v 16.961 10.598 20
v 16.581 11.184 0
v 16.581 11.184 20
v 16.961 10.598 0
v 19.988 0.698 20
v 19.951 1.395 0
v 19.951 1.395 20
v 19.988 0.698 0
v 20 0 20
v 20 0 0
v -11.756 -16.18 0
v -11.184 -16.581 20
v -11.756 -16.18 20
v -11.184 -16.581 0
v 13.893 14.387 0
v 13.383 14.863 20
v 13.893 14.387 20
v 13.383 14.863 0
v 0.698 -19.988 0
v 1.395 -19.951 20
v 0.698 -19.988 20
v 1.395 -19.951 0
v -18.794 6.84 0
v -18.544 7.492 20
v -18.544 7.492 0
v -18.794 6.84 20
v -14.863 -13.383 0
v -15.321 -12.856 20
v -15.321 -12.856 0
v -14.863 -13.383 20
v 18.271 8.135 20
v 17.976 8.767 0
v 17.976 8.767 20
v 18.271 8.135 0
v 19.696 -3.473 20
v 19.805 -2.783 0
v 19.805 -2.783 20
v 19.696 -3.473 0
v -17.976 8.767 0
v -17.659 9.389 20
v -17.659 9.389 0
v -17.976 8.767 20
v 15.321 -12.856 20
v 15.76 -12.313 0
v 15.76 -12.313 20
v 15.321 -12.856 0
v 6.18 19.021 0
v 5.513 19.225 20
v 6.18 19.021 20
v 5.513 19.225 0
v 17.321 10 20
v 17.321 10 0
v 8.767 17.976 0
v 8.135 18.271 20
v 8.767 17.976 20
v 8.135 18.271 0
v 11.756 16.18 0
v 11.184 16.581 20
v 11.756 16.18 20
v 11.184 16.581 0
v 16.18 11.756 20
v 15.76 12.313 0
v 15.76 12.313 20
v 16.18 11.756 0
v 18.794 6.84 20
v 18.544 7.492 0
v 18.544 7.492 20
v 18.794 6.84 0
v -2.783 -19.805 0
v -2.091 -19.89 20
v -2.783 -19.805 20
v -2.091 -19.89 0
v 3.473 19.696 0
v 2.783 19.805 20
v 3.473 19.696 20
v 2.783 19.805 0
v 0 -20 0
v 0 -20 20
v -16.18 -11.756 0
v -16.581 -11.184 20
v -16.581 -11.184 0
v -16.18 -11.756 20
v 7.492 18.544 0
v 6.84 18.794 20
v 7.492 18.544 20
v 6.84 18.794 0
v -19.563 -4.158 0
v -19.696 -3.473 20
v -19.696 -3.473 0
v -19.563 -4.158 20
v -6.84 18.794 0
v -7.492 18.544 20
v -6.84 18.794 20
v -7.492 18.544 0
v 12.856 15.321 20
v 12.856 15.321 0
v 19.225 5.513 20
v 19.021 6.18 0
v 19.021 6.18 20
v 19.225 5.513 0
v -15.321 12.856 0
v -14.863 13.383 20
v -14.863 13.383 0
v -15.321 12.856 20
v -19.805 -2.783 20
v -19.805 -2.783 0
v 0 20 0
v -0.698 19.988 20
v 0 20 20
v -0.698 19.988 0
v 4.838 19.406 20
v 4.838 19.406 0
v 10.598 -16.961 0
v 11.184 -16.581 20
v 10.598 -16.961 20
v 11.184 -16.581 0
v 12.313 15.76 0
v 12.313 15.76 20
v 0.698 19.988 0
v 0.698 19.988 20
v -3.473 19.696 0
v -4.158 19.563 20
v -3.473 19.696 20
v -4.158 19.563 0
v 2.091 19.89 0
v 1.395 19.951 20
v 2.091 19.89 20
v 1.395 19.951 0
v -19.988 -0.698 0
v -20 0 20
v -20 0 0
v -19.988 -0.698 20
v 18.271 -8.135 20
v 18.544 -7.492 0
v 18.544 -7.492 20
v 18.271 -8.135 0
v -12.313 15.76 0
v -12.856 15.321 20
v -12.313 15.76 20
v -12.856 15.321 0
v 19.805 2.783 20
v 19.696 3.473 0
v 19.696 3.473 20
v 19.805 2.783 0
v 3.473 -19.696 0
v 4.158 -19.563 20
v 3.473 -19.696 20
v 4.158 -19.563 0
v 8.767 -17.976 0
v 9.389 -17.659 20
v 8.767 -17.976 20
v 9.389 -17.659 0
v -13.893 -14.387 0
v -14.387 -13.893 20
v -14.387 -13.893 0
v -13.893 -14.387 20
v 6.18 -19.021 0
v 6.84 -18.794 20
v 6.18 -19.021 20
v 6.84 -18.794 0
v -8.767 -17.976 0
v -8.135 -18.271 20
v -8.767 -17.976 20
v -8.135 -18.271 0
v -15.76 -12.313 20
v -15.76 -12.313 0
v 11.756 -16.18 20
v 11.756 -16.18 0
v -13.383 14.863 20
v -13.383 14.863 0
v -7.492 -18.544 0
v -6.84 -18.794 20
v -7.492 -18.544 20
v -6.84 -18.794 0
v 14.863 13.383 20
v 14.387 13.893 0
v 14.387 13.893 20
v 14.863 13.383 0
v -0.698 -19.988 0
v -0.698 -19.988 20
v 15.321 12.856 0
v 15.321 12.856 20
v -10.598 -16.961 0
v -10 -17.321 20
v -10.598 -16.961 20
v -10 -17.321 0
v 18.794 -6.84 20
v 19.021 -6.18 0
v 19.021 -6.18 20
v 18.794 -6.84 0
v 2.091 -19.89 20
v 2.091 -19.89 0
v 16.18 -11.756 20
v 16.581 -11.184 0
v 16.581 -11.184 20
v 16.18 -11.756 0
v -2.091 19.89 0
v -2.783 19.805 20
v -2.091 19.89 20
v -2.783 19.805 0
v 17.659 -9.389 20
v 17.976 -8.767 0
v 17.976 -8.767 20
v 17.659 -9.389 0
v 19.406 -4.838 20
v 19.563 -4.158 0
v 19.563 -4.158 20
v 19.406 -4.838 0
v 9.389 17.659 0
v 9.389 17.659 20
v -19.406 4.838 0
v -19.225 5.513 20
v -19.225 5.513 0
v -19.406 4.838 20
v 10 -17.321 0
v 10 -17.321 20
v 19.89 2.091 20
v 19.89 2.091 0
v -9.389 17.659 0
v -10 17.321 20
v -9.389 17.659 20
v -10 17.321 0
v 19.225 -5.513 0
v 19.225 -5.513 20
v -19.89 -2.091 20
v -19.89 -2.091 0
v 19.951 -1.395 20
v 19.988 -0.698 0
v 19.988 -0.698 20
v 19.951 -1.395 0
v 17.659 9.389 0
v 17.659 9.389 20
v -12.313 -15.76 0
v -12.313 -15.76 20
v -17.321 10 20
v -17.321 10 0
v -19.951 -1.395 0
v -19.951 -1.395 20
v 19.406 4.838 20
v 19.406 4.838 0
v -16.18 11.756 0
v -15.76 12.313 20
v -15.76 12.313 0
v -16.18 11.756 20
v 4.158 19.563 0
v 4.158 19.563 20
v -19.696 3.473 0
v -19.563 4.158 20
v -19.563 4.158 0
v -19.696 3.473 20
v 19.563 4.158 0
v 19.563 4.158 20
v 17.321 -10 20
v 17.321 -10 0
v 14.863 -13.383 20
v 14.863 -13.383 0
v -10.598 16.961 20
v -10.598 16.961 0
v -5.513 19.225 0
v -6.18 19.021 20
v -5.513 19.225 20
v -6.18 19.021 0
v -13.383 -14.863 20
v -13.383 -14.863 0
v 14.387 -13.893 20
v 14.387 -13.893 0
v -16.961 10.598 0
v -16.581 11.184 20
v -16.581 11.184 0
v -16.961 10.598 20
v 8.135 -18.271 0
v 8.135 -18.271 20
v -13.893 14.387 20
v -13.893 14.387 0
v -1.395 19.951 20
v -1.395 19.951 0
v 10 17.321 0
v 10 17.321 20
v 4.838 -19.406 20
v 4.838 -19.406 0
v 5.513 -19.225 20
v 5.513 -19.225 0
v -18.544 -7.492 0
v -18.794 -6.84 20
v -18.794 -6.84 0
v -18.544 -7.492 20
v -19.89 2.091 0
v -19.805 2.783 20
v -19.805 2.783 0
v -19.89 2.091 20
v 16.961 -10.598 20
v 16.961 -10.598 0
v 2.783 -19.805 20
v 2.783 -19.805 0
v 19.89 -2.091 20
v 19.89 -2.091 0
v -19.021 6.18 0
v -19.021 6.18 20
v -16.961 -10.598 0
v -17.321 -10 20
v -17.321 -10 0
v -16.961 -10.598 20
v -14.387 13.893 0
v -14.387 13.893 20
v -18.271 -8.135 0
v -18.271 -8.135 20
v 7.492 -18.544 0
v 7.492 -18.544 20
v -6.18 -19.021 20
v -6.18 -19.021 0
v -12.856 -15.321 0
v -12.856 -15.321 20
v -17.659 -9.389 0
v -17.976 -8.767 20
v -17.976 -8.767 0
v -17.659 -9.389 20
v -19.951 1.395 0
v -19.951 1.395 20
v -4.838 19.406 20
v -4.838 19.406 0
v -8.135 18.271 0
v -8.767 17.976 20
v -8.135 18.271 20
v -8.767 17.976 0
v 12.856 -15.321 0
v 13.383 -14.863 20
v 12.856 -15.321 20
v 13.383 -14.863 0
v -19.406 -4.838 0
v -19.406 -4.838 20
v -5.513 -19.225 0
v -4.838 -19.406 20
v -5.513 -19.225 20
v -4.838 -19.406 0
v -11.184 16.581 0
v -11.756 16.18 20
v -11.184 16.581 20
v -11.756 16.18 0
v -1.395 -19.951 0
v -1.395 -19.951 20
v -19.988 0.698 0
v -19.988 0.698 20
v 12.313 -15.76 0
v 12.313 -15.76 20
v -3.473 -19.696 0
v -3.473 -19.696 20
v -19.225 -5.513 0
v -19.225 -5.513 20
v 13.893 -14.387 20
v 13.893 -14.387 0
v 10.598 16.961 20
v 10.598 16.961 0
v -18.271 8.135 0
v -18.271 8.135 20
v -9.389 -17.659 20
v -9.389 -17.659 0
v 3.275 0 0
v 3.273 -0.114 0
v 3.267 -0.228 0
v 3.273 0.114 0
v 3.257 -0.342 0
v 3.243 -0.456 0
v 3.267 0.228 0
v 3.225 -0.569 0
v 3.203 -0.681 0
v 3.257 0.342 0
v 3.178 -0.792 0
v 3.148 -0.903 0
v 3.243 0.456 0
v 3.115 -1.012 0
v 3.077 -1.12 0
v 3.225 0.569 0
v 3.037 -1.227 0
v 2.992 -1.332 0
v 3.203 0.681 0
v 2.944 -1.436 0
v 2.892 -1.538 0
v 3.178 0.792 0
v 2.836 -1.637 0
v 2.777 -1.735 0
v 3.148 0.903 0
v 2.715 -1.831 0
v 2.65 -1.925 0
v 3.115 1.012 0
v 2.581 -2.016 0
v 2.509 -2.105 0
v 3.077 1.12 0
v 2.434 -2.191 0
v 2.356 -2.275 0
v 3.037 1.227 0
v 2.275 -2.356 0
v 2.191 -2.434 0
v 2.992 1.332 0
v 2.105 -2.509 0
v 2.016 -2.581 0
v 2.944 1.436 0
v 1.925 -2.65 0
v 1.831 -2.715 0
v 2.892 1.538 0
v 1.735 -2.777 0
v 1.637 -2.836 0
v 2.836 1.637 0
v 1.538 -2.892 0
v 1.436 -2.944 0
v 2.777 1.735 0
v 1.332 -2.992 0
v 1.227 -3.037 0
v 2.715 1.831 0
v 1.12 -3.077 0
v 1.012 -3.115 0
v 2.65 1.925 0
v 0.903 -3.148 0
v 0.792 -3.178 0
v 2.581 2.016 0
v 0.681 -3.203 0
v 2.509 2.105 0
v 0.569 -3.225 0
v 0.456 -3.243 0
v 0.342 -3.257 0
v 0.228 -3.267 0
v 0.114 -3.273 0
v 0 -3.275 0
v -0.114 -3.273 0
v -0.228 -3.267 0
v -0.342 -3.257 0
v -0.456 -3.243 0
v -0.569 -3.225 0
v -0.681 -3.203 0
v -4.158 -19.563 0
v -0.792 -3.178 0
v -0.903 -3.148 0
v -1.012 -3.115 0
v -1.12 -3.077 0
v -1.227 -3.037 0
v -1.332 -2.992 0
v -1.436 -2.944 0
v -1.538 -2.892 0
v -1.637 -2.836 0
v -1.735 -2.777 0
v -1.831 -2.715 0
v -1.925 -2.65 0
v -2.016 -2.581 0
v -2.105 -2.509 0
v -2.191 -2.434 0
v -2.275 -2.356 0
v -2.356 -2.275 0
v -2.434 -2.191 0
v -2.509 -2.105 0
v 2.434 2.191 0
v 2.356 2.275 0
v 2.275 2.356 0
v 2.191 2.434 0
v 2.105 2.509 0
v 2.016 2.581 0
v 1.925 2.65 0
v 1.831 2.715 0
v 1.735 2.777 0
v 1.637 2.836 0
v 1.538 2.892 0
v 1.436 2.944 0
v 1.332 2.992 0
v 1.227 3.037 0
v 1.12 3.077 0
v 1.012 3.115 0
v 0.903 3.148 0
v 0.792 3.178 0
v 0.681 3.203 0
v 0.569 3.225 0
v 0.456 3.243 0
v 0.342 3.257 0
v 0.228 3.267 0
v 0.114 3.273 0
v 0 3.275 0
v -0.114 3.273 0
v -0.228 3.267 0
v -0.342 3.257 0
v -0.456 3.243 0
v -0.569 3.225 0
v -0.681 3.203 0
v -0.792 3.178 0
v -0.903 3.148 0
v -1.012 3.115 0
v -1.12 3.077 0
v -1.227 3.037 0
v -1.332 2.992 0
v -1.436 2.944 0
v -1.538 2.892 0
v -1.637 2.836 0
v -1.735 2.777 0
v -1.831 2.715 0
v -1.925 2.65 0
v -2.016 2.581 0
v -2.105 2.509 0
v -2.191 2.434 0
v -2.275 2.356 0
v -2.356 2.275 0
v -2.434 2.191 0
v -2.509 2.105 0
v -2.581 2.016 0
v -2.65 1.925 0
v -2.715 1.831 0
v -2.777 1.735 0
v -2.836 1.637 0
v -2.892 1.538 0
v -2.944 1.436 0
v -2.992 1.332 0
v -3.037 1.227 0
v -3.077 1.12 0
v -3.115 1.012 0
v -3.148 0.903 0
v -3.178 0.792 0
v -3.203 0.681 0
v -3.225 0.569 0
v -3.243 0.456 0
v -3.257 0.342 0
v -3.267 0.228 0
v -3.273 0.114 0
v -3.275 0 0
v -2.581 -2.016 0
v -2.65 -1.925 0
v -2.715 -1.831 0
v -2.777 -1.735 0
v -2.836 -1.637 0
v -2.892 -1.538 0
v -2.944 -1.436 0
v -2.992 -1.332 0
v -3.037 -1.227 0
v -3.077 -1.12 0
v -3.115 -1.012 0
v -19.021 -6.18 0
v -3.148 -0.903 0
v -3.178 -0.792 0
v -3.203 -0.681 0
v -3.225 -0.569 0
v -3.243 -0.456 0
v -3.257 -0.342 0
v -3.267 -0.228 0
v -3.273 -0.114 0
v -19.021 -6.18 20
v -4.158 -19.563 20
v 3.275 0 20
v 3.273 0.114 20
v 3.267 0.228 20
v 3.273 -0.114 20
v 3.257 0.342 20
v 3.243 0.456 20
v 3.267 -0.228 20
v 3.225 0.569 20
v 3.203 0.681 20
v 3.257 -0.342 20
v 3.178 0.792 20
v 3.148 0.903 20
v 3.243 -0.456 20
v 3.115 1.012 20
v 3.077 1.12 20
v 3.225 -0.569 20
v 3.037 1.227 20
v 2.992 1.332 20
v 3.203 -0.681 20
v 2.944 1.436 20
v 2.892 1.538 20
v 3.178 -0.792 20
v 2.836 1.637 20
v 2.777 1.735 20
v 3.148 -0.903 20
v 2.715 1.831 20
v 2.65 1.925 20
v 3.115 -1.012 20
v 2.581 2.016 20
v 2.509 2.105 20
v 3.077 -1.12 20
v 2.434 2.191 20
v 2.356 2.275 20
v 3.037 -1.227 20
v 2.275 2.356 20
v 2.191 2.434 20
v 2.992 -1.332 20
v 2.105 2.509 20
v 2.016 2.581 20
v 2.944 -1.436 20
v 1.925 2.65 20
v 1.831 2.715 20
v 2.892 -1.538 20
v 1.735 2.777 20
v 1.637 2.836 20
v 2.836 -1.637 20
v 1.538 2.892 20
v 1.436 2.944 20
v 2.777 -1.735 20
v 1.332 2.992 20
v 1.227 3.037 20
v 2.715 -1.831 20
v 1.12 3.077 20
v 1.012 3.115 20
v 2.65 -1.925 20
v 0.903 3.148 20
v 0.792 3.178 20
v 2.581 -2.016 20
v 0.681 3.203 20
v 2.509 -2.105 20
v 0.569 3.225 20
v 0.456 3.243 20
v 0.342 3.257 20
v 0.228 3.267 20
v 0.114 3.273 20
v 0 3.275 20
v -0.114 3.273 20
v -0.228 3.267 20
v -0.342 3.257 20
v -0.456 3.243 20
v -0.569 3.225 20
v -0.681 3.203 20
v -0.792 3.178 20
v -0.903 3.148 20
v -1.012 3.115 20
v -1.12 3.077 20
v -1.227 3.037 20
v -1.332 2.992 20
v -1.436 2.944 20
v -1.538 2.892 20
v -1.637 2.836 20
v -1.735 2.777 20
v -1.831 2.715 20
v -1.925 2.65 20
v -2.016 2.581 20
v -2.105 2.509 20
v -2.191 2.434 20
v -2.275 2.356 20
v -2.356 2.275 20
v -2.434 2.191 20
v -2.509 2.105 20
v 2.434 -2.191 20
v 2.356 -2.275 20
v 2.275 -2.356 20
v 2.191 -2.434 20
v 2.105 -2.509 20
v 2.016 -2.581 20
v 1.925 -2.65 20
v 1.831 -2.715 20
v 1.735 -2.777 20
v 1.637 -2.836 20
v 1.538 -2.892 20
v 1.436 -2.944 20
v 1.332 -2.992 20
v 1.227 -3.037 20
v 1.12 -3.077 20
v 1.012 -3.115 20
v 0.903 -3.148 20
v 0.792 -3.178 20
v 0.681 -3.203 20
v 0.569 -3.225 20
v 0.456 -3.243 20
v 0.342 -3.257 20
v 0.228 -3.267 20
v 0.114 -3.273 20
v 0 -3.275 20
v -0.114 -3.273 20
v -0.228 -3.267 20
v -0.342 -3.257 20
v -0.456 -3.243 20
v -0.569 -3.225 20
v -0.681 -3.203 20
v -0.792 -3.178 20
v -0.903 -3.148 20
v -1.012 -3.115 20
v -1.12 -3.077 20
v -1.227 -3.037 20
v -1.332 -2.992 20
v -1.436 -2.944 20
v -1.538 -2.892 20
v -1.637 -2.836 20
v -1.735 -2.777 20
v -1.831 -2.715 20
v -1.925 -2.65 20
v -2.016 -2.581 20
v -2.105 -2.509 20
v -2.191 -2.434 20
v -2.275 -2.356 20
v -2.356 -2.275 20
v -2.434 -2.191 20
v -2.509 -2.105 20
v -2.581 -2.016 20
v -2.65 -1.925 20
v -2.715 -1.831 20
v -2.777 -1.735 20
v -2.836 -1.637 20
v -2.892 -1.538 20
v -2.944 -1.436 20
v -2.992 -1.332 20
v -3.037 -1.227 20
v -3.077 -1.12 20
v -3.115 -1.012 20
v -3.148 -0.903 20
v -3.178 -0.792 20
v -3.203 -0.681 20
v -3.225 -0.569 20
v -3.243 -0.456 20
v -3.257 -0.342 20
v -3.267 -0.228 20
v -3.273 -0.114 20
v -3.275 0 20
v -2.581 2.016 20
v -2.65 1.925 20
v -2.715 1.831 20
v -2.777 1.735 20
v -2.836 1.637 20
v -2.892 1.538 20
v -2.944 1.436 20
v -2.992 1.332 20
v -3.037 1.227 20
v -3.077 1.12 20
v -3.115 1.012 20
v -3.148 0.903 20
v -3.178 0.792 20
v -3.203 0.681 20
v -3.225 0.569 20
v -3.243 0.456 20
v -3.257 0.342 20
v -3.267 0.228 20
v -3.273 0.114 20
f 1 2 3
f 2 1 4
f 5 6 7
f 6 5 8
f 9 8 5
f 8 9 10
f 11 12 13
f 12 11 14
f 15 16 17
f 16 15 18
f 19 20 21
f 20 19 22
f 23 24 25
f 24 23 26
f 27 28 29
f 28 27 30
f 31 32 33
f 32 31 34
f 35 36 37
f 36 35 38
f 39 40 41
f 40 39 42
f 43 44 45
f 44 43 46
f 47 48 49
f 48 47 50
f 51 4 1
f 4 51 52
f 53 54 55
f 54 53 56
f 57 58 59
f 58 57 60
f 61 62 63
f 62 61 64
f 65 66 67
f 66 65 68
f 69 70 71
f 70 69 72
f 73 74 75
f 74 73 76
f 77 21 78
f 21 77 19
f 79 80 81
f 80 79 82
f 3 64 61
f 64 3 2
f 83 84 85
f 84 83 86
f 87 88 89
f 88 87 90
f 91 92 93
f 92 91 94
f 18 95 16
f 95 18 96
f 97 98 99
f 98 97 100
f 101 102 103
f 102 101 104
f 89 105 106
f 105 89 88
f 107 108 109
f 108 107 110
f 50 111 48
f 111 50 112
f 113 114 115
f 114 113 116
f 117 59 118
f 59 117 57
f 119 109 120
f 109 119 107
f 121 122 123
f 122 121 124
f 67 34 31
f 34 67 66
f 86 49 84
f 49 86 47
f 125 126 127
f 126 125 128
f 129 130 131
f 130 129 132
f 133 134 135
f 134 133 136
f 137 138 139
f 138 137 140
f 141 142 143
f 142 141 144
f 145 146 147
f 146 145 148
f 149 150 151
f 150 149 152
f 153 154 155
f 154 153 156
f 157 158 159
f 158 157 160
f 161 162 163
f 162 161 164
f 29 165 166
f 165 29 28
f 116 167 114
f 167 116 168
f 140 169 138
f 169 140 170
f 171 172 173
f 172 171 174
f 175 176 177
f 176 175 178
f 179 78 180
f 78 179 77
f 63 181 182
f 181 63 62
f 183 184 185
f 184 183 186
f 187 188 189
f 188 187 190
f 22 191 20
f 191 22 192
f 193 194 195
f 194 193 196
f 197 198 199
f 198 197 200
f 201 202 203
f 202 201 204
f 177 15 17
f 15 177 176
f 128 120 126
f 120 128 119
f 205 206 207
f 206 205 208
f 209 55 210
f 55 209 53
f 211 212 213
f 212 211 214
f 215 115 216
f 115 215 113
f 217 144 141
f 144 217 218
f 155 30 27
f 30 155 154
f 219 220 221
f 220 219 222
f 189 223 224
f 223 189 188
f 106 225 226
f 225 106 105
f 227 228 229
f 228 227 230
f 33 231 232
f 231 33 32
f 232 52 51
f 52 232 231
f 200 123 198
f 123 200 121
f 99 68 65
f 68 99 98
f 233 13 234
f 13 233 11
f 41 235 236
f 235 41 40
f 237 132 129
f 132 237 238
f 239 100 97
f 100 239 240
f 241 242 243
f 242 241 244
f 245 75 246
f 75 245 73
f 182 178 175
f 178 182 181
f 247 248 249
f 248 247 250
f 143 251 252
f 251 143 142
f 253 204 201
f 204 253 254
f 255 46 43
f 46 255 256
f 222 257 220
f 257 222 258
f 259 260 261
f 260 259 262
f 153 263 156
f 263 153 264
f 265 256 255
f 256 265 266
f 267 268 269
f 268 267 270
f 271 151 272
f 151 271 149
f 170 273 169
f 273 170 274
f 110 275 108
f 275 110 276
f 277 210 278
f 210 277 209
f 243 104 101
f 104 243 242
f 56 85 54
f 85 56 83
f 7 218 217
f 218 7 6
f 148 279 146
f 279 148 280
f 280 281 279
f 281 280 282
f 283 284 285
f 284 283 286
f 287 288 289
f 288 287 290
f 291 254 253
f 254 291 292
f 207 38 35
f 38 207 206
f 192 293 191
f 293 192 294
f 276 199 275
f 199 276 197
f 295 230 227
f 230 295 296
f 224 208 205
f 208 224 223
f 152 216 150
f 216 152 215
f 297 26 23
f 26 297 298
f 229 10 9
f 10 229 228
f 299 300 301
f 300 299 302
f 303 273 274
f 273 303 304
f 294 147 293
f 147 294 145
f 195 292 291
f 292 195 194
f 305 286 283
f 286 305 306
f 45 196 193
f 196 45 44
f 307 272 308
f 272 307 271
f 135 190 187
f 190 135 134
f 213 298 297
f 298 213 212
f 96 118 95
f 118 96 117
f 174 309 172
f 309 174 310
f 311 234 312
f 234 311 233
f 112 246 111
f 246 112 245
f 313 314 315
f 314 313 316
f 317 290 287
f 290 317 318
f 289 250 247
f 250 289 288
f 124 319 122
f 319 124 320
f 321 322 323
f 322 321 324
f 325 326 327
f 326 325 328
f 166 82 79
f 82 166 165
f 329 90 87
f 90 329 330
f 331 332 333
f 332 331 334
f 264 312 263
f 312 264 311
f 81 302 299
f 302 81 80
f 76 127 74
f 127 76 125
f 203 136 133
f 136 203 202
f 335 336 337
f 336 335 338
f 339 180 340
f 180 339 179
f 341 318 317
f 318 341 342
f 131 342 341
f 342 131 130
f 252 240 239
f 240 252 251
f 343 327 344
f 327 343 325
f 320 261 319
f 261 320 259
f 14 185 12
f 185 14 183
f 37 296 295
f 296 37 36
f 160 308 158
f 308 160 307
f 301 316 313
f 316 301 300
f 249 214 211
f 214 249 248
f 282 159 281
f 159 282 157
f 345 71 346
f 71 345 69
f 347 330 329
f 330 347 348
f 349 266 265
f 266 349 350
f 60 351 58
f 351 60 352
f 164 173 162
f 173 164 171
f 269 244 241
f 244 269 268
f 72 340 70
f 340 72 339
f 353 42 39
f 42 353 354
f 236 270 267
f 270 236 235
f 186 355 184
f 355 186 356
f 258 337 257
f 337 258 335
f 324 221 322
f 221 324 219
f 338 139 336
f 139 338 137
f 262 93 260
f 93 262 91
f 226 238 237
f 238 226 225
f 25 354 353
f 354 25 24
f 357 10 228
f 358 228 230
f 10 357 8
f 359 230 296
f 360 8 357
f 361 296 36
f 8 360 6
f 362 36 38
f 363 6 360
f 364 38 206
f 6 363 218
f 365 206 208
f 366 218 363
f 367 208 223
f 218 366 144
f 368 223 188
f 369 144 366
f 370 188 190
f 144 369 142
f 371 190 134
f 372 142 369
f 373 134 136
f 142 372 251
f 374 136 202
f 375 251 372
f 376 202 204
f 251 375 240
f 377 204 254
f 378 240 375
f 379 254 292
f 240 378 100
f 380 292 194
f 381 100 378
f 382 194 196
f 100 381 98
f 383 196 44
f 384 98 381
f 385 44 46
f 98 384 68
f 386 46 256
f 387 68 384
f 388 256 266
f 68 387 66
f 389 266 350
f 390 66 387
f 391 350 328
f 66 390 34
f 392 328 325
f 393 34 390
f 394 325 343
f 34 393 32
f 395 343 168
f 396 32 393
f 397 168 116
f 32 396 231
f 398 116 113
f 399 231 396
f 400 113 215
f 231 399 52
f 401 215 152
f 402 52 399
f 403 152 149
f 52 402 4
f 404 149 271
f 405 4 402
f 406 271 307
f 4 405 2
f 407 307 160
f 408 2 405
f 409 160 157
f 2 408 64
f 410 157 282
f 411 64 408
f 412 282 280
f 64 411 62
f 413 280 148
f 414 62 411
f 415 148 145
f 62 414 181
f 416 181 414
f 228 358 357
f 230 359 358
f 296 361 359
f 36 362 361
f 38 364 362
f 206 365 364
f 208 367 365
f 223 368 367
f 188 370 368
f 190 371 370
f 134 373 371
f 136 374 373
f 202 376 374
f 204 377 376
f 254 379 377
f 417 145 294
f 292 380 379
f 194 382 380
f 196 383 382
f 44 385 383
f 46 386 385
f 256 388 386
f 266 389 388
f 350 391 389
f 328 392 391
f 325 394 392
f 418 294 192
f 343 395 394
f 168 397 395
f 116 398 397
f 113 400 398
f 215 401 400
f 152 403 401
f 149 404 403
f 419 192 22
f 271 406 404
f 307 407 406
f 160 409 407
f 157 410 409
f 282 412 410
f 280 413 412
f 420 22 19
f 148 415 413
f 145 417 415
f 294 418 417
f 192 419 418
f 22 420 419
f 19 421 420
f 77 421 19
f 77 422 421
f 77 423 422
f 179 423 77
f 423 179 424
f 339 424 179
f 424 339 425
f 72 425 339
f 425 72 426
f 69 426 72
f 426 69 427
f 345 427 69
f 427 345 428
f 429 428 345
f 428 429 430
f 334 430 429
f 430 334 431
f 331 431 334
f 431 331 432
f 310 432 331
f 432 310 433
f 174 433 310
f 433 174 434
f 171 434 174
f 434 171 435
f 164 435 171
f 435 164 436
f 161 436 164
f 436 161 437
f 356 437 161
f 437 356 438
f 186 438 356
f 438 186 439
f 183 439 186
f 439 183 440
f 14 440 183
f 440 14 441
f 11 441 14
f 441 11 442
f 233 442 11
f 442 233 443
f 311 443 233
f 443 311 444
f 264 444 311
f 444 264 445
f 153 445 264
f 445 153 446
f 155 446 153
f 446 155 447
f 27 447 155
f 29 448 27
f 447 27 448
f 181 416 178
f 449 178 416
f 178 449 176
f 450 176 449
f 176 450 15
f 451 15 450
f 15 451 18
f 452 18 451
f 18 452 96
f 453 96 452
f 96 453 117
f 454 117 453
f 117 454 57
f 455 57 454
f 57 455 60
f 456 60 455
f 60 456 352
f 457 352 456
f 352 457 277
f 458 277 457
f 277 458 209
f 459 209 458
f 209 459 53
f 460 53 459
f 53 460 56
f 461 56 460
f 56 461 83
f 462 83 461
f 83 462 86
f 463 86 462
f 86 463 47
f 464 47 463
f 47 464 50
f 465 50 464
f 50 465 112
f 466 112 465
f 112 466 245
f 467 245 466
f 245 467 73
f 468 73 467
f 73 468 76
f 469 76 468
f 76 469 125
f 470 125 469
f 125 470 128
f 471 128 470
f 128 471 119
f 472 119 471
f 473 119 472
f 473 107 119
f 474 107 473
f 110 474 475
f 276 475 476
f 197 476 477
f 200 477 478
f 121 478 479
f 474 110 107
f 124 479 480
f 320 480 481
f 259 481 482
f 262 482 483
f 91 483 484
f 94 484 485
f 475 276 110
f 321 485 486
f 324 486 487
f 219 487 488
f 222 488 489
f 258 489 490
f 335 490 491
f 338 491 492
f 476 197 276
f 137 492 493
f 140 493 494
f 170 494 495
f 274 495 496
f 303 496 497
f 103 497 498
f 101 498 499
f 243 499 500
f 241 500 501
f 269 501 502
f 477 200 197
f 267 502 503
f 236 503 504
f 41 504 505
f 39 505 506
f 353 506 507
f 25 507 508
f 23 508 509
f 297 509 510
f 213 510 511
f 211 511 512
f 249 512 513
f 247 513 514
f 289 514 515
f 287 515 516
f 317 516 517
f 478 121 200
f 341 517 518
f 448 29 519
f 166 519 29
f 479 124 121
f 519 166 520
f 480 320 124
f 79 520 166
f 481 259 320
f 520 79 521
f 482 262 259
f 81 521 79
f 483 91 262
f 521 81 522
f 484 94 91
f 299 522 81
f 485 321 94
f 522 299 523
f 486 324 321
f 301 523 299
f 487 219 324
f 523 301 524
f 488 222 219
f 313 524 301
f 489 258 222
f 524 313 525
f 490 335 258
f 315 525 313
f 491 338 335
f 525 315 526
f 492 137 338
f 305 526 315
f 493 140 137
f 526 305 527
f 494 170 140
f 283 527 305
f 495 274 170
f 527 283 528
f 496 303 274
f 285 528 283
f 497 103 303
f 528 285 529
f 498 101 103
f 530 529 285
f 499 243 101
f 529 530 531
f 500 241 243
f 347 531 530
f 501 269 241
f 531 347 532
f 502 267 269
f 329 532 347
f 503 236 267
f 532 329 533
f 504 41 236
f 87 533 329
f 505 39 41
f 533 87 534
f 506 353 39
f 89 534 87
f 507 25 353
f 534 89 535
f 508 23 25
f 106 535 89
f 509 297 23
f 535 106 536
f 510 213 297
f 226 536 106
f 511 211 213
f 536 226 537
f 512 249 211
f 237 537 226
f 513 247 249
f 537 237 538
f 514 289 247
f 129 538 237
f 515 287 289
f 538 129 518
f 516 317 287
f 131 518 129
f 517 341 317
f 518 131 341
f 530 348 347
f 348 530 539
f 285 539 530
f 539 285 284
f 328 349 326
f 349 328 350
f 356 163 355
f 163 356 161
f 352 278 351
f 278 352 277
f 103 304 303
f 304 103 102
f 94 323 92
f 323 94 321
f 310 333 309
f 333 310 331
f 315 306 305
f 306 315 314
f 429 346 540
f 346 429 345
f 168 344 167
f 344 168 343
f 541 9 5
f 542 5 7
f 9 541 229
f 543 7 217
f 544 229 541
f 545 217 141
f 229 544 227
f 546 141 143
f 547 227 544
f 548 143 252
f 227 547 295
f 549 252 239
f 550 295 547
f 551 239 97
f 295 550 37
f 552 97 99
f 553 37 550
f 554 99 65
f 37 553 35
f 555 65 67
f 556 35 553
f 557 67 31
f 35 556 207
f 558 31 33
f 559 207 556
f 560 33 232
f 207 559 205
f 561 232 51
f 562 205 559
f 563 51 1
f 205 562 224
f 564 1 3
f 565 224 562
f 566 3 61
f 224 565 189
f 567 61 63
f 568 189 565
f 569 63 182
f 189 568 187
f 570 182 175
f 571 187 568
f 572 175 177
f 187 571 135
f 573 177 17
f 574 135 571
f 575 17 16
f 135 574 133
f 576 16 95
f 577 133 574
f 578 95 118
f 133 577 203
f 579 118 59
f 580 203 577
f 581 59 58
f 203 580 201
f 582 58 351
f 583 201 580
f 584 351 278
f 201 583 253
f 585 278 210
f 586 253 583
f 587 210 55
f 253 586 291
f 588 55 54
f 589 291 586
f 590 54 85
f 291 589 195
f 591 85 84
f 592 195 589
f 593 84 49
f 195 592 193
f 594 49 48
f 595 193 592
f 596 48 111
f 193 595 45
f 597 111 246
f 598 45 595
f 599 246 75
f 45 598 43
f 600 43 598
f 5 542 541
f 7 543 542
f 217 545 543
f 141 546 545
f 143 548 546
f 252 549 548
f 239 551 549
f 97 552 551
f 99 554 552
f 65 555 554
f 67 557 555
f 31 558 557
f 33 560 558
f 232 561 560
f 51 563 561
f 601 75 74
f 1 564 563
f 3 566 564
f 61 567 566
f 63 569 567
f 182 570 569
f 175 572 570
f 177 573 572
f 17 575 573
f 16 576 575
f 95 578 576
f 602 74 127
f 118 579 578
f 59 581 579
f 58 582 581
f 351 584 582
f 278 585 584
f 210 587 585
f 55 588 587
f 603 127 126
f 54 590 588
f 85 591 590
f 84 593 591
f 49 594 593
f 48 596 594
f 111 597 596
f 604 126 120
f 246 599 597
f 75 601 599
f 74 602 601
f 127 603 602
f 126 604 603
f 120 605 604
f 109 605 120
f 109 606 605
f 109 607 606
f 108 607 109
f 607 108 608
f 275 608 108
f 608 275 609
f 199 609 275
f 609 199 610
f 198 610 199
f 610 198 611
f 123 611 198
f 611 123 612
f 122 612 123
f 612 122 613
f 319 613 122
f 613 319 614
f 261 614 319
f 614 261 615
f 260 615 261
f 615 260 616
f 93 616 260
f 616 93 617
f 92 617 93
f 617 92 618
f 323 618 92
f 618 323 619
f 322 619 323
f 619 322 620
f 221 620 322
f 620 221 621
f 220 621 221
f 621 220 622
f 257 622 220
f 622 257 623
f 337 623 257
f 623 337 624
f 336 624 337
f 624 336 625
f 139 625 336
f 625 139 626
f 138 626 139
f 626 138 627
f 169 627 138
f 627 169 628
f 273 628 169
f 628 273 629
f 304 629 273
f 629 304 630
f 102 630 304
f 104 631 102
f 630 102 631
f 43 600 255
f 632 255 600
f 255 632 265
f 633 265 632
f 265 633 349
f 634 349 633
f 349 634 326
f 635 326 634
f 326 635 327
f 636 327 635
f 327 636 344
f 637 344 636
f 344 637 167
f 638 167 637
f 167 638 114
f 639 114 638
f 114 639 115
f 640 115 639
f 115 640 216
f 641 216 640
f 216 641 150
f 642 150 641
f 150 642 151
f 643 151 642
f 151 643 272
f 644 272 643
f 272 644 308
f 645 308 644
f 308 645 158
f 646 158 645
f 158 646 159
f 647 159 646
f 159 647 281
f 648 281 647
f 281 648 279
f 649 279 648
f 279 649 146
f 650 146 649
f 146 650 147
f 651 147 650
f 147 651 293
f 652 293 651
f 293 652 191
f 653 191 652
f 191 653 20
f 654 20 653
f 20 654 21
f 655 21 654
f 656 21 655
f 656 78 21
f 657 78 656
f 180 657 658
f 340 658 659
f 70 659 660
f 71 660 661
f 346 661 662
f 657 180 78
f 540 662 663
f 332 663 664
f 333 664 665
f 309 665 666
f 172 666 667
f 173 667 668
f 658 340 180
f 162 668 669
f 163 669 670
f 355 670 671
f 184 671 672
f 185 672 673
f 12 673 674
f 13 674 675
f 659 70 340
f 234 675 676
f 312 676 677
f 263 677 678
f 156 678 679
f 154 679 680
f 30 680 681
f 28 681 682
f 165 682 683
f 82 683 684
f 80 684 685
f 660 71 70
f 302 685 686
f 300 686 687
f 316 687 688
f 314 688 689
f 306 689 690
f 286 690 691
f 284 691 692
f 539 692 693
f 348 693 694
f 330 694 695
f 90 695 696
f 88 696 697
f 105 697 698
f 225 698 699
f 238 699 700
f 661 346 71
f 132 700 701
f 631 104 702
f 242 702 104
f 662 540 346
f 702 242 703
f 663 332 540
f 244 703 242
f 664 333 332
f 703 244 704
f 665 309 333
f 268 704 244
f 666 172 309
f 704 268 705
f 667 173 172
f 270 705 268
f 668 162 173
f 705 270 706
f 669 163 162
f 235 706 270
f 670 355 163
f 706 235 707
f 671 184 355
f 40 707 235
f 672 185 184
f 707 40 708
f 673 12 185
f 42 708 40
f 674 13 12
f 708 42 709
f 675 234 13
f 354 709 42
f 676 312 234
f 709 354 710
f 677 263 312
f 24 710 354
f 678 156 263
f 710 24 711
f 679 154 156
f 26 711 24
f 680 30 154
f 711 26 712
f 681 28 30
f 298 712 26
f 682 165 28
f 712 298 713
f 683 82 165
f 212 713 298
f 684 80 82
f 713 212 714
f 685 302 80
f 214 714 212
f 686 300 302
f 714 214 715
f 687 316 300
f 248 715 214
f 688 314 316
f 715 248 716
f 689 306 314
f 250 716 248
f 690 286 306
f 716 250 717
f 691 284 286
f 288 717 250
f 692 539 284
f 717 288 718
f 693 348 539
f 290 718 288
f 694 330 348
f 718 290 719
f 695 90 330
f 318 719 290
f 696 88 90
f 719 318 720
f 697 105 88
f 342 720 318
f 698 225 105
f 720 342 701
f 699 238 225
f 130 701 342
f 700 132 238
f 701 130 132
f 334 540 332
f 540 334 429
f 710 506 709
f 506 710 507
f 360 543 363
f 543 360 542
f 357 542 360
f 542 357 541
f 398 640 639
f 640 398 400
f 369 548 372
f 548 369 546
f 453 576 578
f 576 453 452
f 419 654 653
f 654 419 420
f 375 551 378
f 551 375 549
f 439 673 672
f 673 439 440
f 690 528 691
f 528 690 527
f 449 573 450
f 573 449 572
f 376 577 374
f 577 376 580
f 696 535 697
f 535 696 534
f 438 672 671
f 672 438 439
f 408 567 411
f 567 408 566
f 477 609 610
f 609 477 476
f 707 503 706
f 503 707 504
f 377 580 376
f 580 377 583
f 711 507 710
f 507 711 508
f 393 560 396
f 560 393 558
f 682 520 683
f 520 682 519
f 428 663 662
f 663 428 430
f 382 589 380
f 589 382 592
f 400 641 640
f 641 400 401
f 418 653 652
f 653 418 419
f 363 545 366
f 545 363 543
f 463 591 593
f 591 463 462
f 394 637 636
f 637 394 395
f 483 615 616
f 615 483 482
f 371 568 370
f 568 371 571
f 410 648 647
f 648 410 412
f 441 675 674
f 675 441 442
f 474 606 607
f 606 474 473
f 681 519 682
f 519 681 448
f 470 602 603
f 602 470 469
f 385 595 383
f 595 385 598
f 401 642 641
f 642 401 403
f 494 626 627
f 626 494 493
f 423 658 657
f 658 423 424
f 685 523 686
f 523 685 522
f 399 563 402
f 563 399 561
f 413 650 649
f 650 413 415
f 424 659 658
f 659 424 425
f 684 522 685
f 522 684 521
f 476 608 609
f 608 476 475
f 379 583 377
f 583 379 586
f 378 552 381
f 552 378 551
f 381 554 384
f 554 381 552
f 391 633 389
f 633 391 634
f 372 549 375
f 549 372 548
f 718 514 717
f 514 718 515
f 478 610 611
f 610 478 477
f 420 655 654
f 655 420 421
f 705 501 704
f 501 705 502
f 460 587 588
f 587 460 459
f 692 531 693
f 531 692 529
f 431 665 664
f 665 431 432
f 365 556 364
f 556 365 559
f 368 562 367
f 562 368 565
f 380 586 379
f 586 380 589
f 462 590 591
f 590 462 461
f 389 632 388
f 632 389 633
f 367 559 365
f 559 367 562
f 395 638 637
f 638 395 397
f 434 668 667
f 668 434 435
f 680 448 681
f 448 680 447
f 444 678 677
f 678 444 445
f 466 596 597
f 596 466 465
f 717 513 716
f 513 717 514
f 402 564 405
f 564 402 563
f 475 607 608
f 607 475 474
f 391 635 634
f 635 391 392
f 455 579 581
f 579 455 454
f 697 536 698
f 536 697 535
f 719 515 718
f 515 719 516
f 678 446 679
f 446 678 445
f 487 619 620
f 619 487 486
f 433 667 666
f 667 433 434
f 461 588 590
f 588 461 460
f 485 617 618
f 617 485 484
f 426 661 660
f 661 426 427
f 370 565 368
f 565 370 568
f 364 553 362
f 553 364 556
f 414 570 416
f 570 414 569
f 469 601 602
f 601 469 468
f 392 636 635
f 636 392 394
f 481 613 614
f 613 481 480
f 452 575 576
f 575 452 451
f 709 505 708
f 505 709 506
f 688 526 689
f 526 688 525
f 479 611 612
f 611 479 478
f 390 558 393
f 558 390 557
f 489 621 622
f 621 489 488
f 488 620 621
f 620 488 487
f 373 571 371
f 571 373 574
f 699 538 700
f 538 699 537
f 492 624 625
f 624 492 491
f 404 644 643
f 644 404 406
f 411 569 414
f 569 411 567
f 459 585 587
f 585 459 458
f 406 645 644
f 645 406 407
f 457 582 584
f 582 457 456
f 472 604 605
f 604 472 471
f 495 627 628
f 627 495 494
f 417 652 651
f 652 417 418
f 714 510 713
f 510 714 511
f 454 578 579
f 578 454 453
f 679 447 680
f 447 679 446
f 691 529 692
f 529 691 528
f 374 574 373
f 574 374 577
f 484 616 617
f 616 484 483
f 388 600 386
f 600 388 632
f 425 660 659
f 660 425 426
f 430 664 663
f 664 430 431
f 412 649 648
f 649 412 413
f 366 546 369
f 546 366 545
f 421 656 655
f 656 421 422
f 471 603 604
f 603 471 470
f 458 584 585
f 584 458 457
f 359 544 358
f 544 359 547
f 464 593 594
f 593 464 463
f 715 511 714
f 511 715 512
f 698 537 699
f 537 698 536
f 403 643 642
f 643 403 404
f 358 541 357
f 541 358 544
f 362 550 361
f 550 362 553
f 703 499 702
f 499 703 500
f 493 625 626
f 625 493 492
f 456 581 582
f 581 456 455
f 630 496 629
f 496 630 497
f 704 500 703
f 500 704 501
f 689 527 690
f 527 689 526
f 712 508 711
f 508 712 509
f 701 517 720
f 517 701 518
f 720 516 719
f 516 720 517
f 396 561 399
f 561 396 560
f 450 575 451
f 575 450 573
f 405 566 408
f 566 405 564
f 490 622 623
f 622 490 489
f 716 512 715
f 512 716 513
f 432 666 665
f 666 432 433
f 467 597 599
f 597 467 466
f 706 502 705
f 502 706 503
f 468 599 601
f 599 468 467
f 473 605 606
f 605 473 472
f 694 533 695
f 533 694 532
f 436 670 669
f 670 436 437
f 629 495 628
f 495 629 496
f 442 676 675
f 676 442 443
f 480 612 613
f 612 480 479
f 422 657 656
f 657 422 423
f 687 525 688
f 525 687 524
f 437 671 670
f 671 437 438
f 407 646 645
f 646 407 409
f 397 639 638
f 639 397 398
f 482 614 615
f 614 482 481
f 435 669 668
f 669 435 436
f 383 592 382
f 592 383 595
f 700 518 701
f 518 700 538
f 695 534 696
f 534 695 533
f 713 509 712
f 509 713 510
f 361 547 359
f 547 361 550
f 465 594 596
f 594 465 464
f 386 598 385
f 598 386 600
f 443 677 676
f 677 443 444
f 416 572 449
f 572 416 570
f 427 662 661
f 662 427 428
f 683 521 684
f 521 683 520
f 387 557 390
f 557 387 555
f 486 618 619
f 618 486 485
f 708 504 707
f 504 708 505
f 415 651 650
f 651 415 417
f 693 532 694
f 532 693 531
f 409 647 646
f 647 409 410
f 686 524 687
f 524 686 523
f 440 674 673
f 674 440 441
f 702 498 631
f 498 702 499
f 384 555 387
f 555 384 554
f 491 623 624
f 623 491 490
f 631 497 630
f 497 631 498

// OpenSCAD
$fs=0.1; $fa=2;
inch=25.4;
thru=0.2+0.25*inch;
OD=20*2;
Z=20;


difference() {
    cylinder(d=OD,h=Z);
    cylinder(d=thru,h=2*Z+1,center=true);
}
